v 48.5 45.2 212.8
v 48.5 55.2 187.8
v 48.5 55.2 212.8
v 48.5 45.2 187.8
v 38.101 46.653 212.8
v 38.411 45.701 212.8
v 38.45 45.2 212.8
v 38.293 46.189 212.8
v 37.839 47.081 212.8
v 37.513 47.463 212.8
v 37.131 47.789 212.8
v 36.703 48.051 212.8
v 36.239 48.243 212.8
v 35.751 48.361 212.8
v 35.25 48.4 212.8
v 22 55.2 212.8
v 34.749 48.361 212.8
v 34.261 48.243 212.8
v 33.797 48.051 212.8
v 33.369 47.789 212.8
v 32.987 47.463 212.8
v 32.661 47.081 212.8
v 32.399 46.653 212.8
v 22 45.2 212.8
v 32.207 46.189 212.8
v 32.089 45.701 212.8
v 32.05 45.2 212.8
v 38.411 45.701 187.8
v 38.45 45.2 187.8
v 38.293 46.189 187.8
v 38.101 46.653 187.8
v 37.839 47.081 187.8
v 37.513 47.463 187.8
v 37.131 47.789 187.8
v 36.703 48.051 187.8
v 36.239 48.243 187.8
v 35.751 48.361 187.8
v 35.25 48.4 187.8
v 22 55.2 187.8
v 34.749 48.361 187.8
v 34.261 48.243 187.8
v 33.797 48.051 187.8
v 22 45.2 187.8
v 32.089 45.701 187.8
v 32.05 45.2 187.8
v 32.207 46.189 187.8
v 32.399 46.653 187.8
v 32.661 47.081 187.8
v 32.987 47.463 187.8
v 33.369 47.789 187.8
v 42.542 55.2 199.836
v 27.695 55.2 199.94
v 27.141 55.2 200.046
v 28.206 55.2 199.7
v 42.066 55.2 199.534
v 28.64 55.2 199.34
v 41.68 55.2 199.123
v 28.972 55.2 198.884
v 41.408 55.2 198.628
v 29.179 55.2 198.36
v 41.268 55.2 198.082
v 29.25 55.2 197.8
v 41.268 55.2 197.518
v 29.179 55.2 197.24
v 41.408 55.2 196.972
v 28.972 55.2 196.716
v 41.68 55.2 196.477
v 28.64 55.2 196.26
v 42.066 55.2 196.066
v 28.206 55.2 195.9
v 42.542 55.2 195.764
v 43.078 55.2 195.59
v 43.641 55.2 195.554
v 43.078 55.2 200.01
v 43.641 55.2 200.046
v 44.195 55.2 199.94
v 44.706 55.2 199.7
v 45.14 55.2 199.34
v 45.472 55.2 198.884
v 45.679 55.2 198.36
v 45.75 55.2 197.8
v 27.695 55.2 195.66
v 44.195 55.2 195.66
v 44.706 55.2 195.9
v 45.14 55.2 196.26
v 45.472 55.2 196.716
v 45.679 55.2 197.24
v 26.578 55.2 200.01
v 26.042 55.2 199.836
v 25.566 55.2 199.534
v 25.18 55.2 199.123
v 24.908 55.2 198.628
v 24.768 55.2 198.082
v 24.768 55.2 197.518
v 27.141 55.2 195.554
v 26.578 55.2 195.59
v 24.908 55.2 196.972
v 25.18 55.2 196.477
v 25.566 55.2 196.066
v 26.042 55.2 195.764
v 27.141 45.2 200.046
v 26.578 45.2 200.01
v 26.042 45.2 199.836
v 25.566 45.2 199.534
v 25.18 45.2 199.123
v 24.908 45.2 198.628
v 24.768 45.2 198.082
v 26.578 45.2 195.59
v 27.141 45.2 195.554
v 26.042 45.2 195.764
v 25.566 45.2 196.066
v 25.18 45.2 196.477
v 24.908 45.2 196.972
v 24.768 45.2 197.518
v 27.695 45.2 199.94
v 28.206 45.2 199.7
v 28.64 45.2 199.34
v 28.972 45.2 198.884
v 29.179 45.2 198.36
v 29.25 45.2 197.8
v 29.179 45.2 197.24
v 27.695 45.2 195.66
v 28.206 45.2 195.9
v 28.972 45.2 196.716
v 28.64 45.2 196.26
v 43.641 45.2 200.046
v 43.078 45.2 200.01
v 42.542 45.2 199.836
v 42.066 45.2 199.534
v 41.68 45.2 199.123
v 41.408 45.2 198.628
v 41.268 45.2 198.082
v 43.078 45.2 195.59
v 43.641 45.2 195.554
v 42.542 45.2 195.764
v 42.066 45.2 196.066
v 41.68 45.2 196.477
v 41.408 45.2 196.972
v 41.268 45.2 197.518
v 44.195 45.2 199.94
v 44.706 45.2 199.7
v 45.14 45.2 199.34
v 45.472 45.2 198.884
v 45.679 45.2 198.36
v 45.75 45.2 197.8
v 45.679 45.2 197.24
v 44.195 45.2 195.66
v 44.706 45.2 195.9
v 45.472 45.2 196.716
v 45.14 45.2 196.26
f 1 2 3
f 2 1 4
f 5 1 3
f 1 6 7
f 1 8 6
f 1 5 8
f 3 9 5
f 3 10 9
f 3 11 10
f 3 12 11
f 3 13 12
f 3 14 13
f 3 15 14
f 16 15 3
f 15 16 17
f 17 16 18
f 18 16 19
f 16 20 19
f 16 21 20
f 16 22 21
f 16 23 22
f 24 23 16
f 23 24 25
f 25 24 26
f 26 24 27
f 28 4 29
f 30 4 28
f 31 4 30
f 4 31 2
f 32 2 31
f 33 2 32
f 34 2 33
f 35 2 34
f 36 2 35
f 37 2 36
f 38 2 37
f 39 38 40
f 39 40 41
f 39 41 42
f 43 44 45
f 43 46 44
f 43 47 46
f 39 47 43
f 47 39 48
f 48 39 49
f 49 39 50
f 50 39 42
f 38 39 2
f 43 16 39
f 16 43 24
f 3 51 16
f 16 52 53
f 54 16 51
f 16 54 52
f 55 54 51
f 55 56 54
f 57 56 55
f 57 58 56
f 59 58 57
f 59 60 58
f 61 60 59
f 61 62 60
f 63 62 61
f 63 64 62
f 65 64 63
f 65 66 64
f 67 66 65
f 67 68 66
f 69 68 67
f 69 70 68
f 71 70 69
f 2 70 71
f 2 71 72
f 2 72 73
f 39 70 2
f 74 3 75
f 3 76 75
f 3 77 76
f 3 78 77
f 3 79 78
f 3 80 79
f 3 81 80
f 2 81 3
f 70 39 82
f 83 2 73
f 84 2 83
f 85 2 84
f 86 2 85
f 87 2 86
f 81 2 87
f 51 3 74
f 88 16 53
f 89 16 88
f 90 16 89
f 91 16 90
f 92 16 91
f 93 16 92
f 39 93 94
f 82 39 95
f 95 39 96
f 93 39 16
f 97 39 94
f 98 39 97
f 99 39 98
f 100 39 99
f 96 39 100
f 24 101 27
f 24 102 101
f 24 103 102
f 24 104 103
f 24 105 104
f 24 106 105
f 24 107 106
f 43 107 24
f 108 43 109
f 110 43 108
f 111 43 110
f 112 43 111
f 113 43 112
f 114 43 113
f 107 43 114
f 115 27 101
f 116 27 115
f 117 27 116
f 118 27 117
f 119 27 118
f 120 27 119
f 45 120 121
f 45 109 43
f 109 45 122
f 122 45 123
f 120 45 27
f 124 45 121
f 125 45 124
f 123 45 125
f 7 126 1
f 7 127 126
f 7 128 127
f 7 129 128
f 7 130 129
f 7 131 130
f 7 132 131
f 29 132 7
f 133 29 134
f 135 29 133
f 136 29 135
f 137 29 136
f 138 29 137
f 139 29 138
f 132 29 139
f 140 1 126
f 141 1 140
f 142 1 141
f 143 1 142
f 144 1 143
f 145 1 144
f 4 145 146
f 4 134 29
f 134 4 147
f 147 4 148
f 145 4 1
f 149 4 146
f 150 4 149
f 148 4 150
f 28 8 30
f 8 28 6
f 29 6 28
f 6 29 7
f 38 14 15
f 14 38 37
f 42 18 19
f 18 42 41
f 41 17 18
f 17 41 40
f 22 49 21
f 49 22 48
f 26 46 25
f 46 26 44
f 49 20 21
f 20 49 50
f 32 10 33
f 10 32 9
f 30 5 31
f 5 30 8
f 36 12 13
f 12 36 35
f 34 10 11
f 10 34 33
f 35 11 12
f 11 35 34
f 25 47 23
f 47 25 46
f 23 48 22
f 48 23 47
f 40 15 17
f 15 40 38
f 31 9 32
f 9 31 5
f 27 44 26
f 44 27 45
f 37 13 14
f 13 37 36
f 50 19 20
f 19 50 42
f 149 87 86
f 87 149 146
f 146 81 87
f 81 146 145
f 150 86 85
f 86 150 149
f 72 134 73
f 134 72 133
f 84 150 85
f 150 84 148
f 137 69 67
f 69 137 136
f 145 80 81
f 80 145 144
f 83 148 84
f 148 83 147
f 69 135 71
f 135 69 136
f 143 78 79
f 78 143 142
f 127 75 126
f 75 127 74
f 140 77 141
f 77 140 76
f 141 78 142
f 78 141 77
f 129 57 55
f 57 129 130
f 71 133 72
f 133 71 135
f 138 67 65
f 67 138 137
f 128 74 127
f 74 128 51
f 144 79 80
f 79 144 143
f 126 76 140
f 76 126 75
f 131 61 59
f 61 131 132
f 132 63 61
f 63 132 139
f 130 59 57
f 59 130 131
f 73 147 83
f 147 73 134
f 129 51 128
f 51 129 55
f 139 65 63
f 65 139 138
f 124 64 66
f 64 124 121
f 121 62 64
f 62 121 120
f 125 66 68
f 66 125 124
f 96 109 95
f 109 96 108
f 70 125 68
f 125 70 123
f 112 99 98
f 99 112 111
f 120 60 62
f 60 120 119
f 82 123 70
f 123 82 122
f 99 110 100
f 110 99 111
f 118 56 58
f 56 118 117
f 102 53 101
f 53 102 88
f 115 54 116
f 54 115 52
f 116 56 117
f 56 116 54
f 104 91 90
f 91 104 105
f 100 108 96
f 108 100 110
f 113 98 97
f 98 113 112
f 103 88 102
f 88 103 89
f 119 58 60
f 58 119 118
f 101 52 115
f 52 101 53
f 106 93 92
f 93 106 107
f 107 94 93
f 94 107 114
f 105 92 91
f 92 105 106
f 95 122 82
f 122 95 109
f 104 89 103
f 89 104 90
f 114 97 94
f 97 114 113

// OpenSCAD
// file: gear.scad
module gear (
	mm_per_tooth    = 3,    //this is the "circular pitch", the circumference of the pitch circle divided by the number of teeth
	number_of_teeth = 11,   //total number of teeth around the entire perimeter
	thickness       = 6,    //thickness of gear in mm
	hole_diameter   = 3,    //diameter of the hole in the center, in mm
	twist           = 0,    //teeth rotate this many degrees from bottom of gear to top.  360 makes the gear a screw with each thread going around once
	teeth_to_hide   = 0,    //number of teeth to delete to make this only a fraction of a circle
	pressure_angle  = 28,   //Controls how straight or bulged the tooth sides are. In degrees.
	clearance       = 0.0,  //gap between top of a tooth on one gear and bottom of valley on a meshing gear (in millimeters)
	backlash        = 0.0   //gap between two meshing teeth, in the direction along the circumference of the pitch circle
) {
	pi = 3.1415926;
	p  = mm_per_tooth * number_of_teeth / pi / 2;  //radius of pitch circle
	c  = p + mm_per_tooth / pi - clearance;       //radius of outer circle
	b  = p*cos(pressure_angle);                    //radius of base circle
	r  = p-(c-p)-clearance;                        //radius of root circle
	t  = mm_per_tooth/2-backlash/2;                //tooth thickness at pitch circle
	k  = -iang(b, p) - t/2/p/pi*180;
    {             //angle to where involute meets base circle on each side of tooth
		difference() {
			for (i = [0:number_of_teeth-teeth_to_hide-1] )
				rotate([0,0,i*360/number_of_teeth])
					linear_extrude(height = thickness, center = true, convexity = 10, twist = twist)
						polygon(
							points=[
								[0, -hole_diameter/10],
								polar(r, -181/number_of_teeth),
								polar(r, r<b ? k : -180/number_of_teeth),
								q7(0/5,r,b,c,k, 1),q7(1/5,r,b,c,k, 1),q7(2/5,r,b,c,k, 1),q7(3/5,r,b,c,k, 1),q7(4/5,r,b,c,k, 1),q7(5/5,r,b,c,k, 1),
								q7(5/5,r,b,c,k,-1),q7(4/5,r,b,c,k,-1),q7(3/5,r,b,c,k,-1),q7(2/5,r,b,c,k,-1),q7(1/5,r,b,c,k,-1),q7(0/5,r,b,c,k,-1),
								polar(r, r<b ? -k : 180/number_of_teeth),
								polar(r, 181/number_of_teeth)
							],
 							paths=[[0,1,2,3,4,5,6,7,8,9,10,11,12,13,14,15,16]]
						);
			cylinder(h=2*thickness+1, r=hole_diameter/2, center=true, $fn=20);
		}
	}
};	
//these 4 functions are used by gear
function polar(r,theta)   = r*[sin(theta), cos(theta)];                            //convert polar to cartesian coordinates
function iang(r1,r2)      = sqrt((r2/r1)*(r2/r1) - 1)/3.1415926*180 - acos(r1/r2); //unwind a string this many degrees to go from radius r1 to radius r2
function q7(f,r,b,r2,t,s) = q6(b,s,t,(1-f)*max(b,r)+f*r2);                         //radius a fraction f up the curved side of the tooth 
function q6(b,s,t,d)      = polar(d,s*(iang(b,d)+t));                              //point at radius d on the involute curve

//a rack, which is a straight line with teeth (the same as a segment from a giant gear with a huge number of teeth).
//The "pitch circle" is a line along the X axis.
module rack (
	mm_per_tooth    = 3,    //this is the "circular pitch", the circumference of the pitch circle divided by the number of teeth
	number_of_teeth = 11,   //total number of teeth along the rack
	thickness       = 6,    //thickness of rack in mm (affects each tooth)
	height          = 120,   //height of rack in mm, from tooth top to far side of rack.
	pressure_angle  = 28,   //Controls how straight or bulged the tooth sides are. In degrees.
	backlash        = 0.0   //gap between two meshing teeth, in the direction along the circumference of the pitch circle
) {
	pi = 3.1415926;
	a = mm_per_tooth / pi; //addendum
	t = a*cos(pressure_angle)-1;         //tooth side is tilted so top/bottom corners move this amount
		for (i = [0:number_of_teeth-1] )
			translate([i*mm_per_tooth,0,0])
				linear_extrude(height = thickness, center = true, convexity = 10)
					polygon(
						points=[
							[-mm_per_tooth * 3/4,                 a-height],
							[-mm_per_tooth * 3/4 - backlash,     -a],
							[-mm_per_tooth * 1/4 + backlash - t, -a],
							[-mm_per_tooth * 1/4 + backlash + t,  a],
							[ mm_per_tooth * 1/4 - backlash - t,  a],
							[ mm_per_tooth * 1/4 - backlash + t, -a],
							[ mm_per_tooth * 3/4 + backlash,     -a],
							[ mm_per_tooth * 3/4,                 a-height],
						],
						paths=[[0,1,2,3,4,5,6,7]]
					);
};	

//These 5 functions let the user find the derived dimensions of the gear.
//A gear fits within a circle of radius outer_radius, and two gears should have
//their centers separated by the sum of their pictch_radius.
function circular_pitch  (mm_per_tooth=3) = mm_per_tooth;                     //tooth density expressed as "circular pitch" in millimeters
function diametral_pitch (mm_per_tooth=3) = 3.1415926 / mm_per_tooth;         //tooth density expressed as "diametral pitch" in teeth per millimeter
function module_value    (mm_per_tooth=3) = mm_per_tooth / pi;                //tooth density expressed as "module" or "modulus" in millimeters
function pitch_radius    (mm_per_tooth=3,number_of_teeth=11) = mm_per_tooth * number_of_teeth / 3.1415926 / 2;
function outer_radius    (mm_per_tooth=3,number_of_teeth=11,clearance=0.1)    //The gear fits entirely within a cylinder of this radius.
	= mm_per_tooth*(1+number_of_teeth/2)/3.1415926  - clearance;              
// file: utils.scad
use <gear.scad>
module intHoles(){
    linear_extrude(5){
        translate([0,0])circle(r=2.25,$fn=20);
        translate([30,0])circle(r=2.25,$fn=20);
        translate([0,30])circle(r=2.25,$fn=20);
        translate([30,30])circle(r=2.25,$fn=20);
    }
}
module cone1(){
    cylinder(r1=8/2,r2=3.5/2,h=3,$fn=20);
}
module motorHole(x=0.15){
    //mini motor
    difference(){
        circle(r=1.45+x,$fn=30);
        translate([0.9+1.5+2*x,0])square([3,3],center=true);
    }
}
module gearSection(a,n,h,r=0){
    intersection(){
        translate([0,0,h/2])rotate([0,0,r])gear(3.13,n,h,0);
        linear_extrude(h)polygon(points=[[0,0],[100,0],
        [100*cos(a/5),100*sin(a/5)],
        [100*cos(2*a/5),100*sin(2*a/5)],[100*cos(3*a/5),100*sin(3*a/5)],
        [100*cos(4*a/5),100*sin(4*a/5)],[100*cos(a),100*sin(a)]]);
    }
}
module semicircle(r1,r2){
    difference(){
        circle(r=r2,$fn=50);
        translate([-r2,-r2])square([2*r2,r2]);
        circle(r=r1,$fn=50);
    }
}
module arc(r1,r2,x){
    intersection(){
        semicircle(r1,r2);
        rotate(180+x)semicircle(r1,r2);
    }
}
module littleMotor(){
    cube([12,25,10]);
    translate([6,25,5])rotate([-90,0,0])linear_extrude(10)motorHole();
}
module bolt(){
    cylinder(r=2.25,h=25,$fn=20);
}
module dmotorHole(x=0.1){
    difference(){
        circle(r=2+x,$fn=25);
        translate([3.4-2+x,-2.5])square([3,5]);
    }
}
module blt(h){
    cylinder(r=2.25,h=h,$fn=25);
}
// main file
use <utils.scad>

/*
y-axis is front panel
x-axis is middle
x-y plane is floor
*/
module fakeClaw(){
    w=4;
    translate([-15,-45-36,41])difference(){
        cube([15,50,47]);
        //bolts
        translate([0,5,12])rotate([0,90,0])blt(15);
        translate([0,5,42])rotate([0,90,0])blt(15);
        translate([0,45,12])rotate([0,90,0])blt(15);
        translate([0,45,42])rotate([0,90,0])blt(15);
    }
}//fakeClaw();
d=38;
rd = 22;
mh = 12.5 + 2.5;
wh = 6;
md = sqrt(d*d - pow(mh-wh,2));
l = md*4;
module baseHoles(){
    translate([l/2-16,5])circle(r=2.25,$fn=25);
    translate([l/2-16,13])circle(r=2.25,$fn=25);
    translate([l/2+16,5])circle(r=2.25,$fn=25);
    translate([l/2+16,13])circle(r=2.25,$fn=25);
    
    translate([l/2-68,5])circle(r=2.25,$fn=25);
    translate([l/2-68,13])circle(r=2.25,$fn=25);
    translate([l/2+68,5])circle(r=2.25,$fn=25);
    translate([l/2+68,13])circle(r=2.25,$fn=25);
}

module __fakeDrive(){
    translate([-5,-9,24])difference(){
        cube([l,18,5]);
        linear_extrude(5)baseHoles();
    }
}
module __fakeDrive2(){
    translate([-5,-9,24])difference(){
        translate([l/2-md,0,0])cube([md*2,18,5]);
        linear_extrude(5)baseHoles();
    }
}

module fakeDrive(){
    translate([40,68,0])__fakeDrive();
    translate([40,40,0])__fakeDrive2();
    translate([40,-68,0])__fakeDrive();
    translate([40,-40,0])__fakeDrive2();
}//fakeDrive();

module fakeRev(){
    translate([0,0,193])difference(){
        translate([6,-100,0])cube([40,120,5]);
        
        translate([22-6.5,8.75,0])cylinder(r=2.25,h=5,$fn=20);
        translate([22-6.5,-8.75,0])cylinder(r=2.25,h=5,$fn=20);
        translate([42-6.5,8.75,0])cylinder(r=2.25,h=5,$fn=20);
        translate([42-6.5,-8.75,0])cylinder(r=2.25,h=5,$fn=20);
        
        translate([13.5,-30,0])cylinder(r=2.25,h=5,$fn=20);
        translate([13.5,-88,0])cylinder(r=2.25,h=5,$fn=20);
        translate([27.5,-30,0])cylinder(r=2.25,h=5,$fn=20);
        translate([27.5,-88,0])cylinder(r=2.25,h=5,$fn=20);
    }
    translate([-6.5,0,205.5])rotate([0,90,0])
    cylinder(r=28.5,h=10,$fn=60);
}//fakeRev();

module fakeStopper(){
    translate([-5,-15,58])difference(){
        cube([5,30,25]);
        
        translate([0,5,5])rotate([0,90,0])
        cylinder(r=2.25,h=5,$fn=20);
        translate([0,25,5])rotate([0,90,0])
        cylinder(r=2.25,h=5,$fn=20);
        translate([0,5,20])rotate([0,90,0])
        cylinder(r=2.25,h=5,$fn=20);
        translate([0,25,20])rotate([0,90,0])
        cylinder(r=2.25,h=5,$fn=20);
    }
}//fakeStopper();

module skelA1(){
    //right side of drive connector
    difference(){
        union(){
            translate([40,0,10])cube([95,77,14]);
            translate([40,0,10])cube([95,10,50]);
            translate([40,0,10])cube([10,25,50]);
        }
        translate([40,25,10])cube([40,77-25,14]);
        
        translate([35,59,10])linear_extrude(14)baseHoles();
        translate([35,31,10])linear_extrude(14)baseHoles();
        
        translate([95,0,24+5])rotate([-90,0,0])
        cylinder(r=2.25,h=10,$fn=25);
        translate([135-5,0,24+5])rotate([-90,0,0])
        cylinder(r=2.25,h=10,$fn=25);
        translate([95,0,60-5])rotate([-90,0,0])
        cylinder(r=2.25,h=10,$fn=25);
        translate([135-5,0,60-5])rotate([-90,0,0])
        cylinder(r=2.25,h=10,$fn=25);
        
        translate([40,20,24+5])rotate([0,90,0])
        cylinder(r=2.25,h=10,$fn=25);
        translate([40,20,60-5])rotate([0,90,0])
        cylinder(r=2.25,h=10,$fn=25);
    }
}//skelA1();

module skelB1(){
    mirror([0,1,0])skelA1();
}//skelB1();

module skelC(){
    //connects top parts
    translate([0,0,193-5.2])difference(){
        union(){
            translate([8.5,-93,0])cube([40,138,5]);
            //translate([35.5+5,-20,-40])cube([8,40,40]);
            translate([22,45-10,5])cube([40-22+8.5,10,20]);
           
        }
        //rev holder
        translate([22-6.5,8.75,0])cylinder(r=2.25,h=5,$fn=20);
        translate([22-6.5,-8.75,0])cylinder(r=2.25,h=5,$fn=20);
        translate([42-6.5,8.75,0])cylinder(r=2.25,h=5,$fn=20);
        translate([42-6.5,-8.75,0])cylinder(r=2.25,h=5,$fn=20);
        //motor holder
        translate([13.5,-30,0])cylinder(r=2.25,h=5,$fn=20);
        translate([13.5,-88,0])cylinder(r=2.25,h=5,$fn=20);
        translate([27.5,-30,0])cylinder(r=2.25,h=5,$fn=20);
        translate([27.5,-88,0])cylinder(r=2.25,h=5,$fn=20);
        //connector holes
        //translate([
        //photointerrupter holes
        translate([15.5,32+7.5,0])cylinder(r=2.25,h=5,$fn=20);
        translate([15.5,32-7.5,0])cylinder(r=2.25,h=5,$fn=20);
        //platform
        translate([22+26.5/2,45,0])cylinder(r=3.2,h=25,$fn=40);
        translate([40+8.5-5,35,10])rotate([-90,0,0])
        cylinder(r=2.25,h=10,$fn=30);
        translate([22+5,35,10])rotate([-90,0,0])
        cylinder(r=2.25,h=10,$fn=30);
    }
}//skelC();

module skelD(){
    //clamps platform
    difference(){
        cube([26.5,10,25]);
        translate([26.5/2,0,0])cylinder(r=3.2,h=25,$fn=40);
        translate([26.5-5,0,10])rotate([-90,0,0])
        cylinder(r=2.25,h=10,$fn=25);
        translate([5,0,10])rotate([-90,0,0])
        cylinder(r=2.25,h=10,$fn=25);
    }
}translate([22,35+10.2,193-5.2])skelD();

module skelE(){
    //connects top layer to skelF
    difference(){
        union(){
            translate([8,-93,193-5.2-5.2])cube([24,68,5]);
            translate([8,-59-10,42])cube([24,20,193-5.2-5.2-42]);
            translate([8,-81,42])cube([8,50,88-42]);
        }
        //rev holder
        translate([13.5,-30,193-5.2-5.2])cylinder(r=2.25,h=5,$fn=20);
        translate([13.5,-88,193-5.2-5.2])cylinder(r=2.25,h=5,$fn=20);
        translate([27.5,-30,193-5.2-5.2])cylinder(r=2.25,h=5,$fn=20);
        translate([27.5,-88,193-5.2-5.2])cylinder(r=2.25,h=5,$fn=20);
        //holes for claw
        translate([8,-76,53])rotate([0,90,0])blt(8);
        translate([8,-76,83])rotate([0,90,0])blt(8);
        translate([8,-36,53])rotate([0,90,0])blt(8);
        translate([8,-36,83])rotate([0,90,0])blt(8);
    }
}//skelE();

module skelF(){
    //connects drive to front
    difference(){
        union(){
            translate([40-10,-25,24])cube([10,50,36]);
            translate([0,-81,24])cube([8,81+25,64]);
            translate([8,-10,24])cube([22,20,30]);
        }
        //holes for drive
        translate([40-10.2,20,24+5])rotate([0,90,0])
        cylinder(r=2.25,h=10.2,$fn=25);
        translate([40-10.2,20,60-5])rotate([0,90,0])
        cylinder(r=2.25,h=10.2,$fn=25);
        translate([40-10.2,-20,24+5])rotate([0,90,0])
        cylinder(r=2.25,h=10.2,$fn=25);
        translate([40-10.2,-20,60-5])rotate([0,90,0])
        cylinder(r=2.25,h=10.2,$fn=25);
        //holes for claw
        translate([0,-76,53])rotate([0,90,0])blt(8);
        translate([0,-76,83])rotate([0,90,0])blt(8);
        translate([0,-36,53])rotate([0,90,0])blt(8);
        translate([0,-36,83])rotate([0,90,0])blt(8);
        //stopper
        /*translate([0,-10,63])rotate([0,90,0])
        cylinder(r=2.25,h=8,$fn=20);
        translate([0,10,63])rotate([0,90,0])
        cylinder(r=2.25,h=8,$fn=20);*/
        translate([0,-10,78])rotate([0,90,0])
        cylinder(r=2.25,h=8,$fn=20);
        translate([0,10,78])rotate([0,90,0])
        cylinder(r=2.25,h=8,$fn=20);
    }
}//skelF();

module skelG1(){
    //holds servo for flag
    d=40;
    difference(){
        union(){
            cylinder(r=6,h=10,$fn=40);
            translate([-3.5,0,0])cube([3,15,10]);
            cube([5,d,10]);
            translate([0,40,0])cube([20,45,3]);
        }
        //rod
        cylinder(r=6.5/2,h=10,$fn=40);
        //gap
        translate([-1.5,0,0])cube([1.5,15,10]);
        translate([-3.5,10,5])rotate([0,90,0])
        cylinder(r=2.25,h=3.5+5,$fn=25);
        //servo
        translate([5,d+5,0])cylinder(r=2.25,h=3,$fn=25);
        translate([5,d+45-5,0])cylinder(r=2.25,h=3,$fn=25);
    }
}//skelG1();

module skelG2(){
    difference(){
        cube([20,45,3]);
        translate([5,5,0])cylinder(r=2.25,h=3,$fn=25);
        translate([5,40,0])cylinder(r=2.25,h=3,$fn=25);
    }
}//skelG2();

module flagA(){
    //flags
    w=22;
    l=3200/w;
    h=150;
    difference(){
        union(){
            translate([h,0,0])cube([w+2+w,5,3]);
            translate([h,-l,0])cube([w,l,1]);
            translate([h+w+2,-l,0])cube([w,l,1]);
        }
        translate([h,0,3/2])cube([10,5,3/2]);
    }
}//flagA();

module flagB(){
    //flag pole
    w=22;
    l=3200/w;
    h=150;
    difference(){
        union(){
            translate([0,5/2,0])cylinder(r=5,h=3,$fn=30);
            cube([h,5,3]);
            translate([h,0,3/2])cube([10,5,3/2]);
        }
        translate([0,5/2,0])cylinder(r=2.4,h=3,$fn=40);
    }
}//flagB();
